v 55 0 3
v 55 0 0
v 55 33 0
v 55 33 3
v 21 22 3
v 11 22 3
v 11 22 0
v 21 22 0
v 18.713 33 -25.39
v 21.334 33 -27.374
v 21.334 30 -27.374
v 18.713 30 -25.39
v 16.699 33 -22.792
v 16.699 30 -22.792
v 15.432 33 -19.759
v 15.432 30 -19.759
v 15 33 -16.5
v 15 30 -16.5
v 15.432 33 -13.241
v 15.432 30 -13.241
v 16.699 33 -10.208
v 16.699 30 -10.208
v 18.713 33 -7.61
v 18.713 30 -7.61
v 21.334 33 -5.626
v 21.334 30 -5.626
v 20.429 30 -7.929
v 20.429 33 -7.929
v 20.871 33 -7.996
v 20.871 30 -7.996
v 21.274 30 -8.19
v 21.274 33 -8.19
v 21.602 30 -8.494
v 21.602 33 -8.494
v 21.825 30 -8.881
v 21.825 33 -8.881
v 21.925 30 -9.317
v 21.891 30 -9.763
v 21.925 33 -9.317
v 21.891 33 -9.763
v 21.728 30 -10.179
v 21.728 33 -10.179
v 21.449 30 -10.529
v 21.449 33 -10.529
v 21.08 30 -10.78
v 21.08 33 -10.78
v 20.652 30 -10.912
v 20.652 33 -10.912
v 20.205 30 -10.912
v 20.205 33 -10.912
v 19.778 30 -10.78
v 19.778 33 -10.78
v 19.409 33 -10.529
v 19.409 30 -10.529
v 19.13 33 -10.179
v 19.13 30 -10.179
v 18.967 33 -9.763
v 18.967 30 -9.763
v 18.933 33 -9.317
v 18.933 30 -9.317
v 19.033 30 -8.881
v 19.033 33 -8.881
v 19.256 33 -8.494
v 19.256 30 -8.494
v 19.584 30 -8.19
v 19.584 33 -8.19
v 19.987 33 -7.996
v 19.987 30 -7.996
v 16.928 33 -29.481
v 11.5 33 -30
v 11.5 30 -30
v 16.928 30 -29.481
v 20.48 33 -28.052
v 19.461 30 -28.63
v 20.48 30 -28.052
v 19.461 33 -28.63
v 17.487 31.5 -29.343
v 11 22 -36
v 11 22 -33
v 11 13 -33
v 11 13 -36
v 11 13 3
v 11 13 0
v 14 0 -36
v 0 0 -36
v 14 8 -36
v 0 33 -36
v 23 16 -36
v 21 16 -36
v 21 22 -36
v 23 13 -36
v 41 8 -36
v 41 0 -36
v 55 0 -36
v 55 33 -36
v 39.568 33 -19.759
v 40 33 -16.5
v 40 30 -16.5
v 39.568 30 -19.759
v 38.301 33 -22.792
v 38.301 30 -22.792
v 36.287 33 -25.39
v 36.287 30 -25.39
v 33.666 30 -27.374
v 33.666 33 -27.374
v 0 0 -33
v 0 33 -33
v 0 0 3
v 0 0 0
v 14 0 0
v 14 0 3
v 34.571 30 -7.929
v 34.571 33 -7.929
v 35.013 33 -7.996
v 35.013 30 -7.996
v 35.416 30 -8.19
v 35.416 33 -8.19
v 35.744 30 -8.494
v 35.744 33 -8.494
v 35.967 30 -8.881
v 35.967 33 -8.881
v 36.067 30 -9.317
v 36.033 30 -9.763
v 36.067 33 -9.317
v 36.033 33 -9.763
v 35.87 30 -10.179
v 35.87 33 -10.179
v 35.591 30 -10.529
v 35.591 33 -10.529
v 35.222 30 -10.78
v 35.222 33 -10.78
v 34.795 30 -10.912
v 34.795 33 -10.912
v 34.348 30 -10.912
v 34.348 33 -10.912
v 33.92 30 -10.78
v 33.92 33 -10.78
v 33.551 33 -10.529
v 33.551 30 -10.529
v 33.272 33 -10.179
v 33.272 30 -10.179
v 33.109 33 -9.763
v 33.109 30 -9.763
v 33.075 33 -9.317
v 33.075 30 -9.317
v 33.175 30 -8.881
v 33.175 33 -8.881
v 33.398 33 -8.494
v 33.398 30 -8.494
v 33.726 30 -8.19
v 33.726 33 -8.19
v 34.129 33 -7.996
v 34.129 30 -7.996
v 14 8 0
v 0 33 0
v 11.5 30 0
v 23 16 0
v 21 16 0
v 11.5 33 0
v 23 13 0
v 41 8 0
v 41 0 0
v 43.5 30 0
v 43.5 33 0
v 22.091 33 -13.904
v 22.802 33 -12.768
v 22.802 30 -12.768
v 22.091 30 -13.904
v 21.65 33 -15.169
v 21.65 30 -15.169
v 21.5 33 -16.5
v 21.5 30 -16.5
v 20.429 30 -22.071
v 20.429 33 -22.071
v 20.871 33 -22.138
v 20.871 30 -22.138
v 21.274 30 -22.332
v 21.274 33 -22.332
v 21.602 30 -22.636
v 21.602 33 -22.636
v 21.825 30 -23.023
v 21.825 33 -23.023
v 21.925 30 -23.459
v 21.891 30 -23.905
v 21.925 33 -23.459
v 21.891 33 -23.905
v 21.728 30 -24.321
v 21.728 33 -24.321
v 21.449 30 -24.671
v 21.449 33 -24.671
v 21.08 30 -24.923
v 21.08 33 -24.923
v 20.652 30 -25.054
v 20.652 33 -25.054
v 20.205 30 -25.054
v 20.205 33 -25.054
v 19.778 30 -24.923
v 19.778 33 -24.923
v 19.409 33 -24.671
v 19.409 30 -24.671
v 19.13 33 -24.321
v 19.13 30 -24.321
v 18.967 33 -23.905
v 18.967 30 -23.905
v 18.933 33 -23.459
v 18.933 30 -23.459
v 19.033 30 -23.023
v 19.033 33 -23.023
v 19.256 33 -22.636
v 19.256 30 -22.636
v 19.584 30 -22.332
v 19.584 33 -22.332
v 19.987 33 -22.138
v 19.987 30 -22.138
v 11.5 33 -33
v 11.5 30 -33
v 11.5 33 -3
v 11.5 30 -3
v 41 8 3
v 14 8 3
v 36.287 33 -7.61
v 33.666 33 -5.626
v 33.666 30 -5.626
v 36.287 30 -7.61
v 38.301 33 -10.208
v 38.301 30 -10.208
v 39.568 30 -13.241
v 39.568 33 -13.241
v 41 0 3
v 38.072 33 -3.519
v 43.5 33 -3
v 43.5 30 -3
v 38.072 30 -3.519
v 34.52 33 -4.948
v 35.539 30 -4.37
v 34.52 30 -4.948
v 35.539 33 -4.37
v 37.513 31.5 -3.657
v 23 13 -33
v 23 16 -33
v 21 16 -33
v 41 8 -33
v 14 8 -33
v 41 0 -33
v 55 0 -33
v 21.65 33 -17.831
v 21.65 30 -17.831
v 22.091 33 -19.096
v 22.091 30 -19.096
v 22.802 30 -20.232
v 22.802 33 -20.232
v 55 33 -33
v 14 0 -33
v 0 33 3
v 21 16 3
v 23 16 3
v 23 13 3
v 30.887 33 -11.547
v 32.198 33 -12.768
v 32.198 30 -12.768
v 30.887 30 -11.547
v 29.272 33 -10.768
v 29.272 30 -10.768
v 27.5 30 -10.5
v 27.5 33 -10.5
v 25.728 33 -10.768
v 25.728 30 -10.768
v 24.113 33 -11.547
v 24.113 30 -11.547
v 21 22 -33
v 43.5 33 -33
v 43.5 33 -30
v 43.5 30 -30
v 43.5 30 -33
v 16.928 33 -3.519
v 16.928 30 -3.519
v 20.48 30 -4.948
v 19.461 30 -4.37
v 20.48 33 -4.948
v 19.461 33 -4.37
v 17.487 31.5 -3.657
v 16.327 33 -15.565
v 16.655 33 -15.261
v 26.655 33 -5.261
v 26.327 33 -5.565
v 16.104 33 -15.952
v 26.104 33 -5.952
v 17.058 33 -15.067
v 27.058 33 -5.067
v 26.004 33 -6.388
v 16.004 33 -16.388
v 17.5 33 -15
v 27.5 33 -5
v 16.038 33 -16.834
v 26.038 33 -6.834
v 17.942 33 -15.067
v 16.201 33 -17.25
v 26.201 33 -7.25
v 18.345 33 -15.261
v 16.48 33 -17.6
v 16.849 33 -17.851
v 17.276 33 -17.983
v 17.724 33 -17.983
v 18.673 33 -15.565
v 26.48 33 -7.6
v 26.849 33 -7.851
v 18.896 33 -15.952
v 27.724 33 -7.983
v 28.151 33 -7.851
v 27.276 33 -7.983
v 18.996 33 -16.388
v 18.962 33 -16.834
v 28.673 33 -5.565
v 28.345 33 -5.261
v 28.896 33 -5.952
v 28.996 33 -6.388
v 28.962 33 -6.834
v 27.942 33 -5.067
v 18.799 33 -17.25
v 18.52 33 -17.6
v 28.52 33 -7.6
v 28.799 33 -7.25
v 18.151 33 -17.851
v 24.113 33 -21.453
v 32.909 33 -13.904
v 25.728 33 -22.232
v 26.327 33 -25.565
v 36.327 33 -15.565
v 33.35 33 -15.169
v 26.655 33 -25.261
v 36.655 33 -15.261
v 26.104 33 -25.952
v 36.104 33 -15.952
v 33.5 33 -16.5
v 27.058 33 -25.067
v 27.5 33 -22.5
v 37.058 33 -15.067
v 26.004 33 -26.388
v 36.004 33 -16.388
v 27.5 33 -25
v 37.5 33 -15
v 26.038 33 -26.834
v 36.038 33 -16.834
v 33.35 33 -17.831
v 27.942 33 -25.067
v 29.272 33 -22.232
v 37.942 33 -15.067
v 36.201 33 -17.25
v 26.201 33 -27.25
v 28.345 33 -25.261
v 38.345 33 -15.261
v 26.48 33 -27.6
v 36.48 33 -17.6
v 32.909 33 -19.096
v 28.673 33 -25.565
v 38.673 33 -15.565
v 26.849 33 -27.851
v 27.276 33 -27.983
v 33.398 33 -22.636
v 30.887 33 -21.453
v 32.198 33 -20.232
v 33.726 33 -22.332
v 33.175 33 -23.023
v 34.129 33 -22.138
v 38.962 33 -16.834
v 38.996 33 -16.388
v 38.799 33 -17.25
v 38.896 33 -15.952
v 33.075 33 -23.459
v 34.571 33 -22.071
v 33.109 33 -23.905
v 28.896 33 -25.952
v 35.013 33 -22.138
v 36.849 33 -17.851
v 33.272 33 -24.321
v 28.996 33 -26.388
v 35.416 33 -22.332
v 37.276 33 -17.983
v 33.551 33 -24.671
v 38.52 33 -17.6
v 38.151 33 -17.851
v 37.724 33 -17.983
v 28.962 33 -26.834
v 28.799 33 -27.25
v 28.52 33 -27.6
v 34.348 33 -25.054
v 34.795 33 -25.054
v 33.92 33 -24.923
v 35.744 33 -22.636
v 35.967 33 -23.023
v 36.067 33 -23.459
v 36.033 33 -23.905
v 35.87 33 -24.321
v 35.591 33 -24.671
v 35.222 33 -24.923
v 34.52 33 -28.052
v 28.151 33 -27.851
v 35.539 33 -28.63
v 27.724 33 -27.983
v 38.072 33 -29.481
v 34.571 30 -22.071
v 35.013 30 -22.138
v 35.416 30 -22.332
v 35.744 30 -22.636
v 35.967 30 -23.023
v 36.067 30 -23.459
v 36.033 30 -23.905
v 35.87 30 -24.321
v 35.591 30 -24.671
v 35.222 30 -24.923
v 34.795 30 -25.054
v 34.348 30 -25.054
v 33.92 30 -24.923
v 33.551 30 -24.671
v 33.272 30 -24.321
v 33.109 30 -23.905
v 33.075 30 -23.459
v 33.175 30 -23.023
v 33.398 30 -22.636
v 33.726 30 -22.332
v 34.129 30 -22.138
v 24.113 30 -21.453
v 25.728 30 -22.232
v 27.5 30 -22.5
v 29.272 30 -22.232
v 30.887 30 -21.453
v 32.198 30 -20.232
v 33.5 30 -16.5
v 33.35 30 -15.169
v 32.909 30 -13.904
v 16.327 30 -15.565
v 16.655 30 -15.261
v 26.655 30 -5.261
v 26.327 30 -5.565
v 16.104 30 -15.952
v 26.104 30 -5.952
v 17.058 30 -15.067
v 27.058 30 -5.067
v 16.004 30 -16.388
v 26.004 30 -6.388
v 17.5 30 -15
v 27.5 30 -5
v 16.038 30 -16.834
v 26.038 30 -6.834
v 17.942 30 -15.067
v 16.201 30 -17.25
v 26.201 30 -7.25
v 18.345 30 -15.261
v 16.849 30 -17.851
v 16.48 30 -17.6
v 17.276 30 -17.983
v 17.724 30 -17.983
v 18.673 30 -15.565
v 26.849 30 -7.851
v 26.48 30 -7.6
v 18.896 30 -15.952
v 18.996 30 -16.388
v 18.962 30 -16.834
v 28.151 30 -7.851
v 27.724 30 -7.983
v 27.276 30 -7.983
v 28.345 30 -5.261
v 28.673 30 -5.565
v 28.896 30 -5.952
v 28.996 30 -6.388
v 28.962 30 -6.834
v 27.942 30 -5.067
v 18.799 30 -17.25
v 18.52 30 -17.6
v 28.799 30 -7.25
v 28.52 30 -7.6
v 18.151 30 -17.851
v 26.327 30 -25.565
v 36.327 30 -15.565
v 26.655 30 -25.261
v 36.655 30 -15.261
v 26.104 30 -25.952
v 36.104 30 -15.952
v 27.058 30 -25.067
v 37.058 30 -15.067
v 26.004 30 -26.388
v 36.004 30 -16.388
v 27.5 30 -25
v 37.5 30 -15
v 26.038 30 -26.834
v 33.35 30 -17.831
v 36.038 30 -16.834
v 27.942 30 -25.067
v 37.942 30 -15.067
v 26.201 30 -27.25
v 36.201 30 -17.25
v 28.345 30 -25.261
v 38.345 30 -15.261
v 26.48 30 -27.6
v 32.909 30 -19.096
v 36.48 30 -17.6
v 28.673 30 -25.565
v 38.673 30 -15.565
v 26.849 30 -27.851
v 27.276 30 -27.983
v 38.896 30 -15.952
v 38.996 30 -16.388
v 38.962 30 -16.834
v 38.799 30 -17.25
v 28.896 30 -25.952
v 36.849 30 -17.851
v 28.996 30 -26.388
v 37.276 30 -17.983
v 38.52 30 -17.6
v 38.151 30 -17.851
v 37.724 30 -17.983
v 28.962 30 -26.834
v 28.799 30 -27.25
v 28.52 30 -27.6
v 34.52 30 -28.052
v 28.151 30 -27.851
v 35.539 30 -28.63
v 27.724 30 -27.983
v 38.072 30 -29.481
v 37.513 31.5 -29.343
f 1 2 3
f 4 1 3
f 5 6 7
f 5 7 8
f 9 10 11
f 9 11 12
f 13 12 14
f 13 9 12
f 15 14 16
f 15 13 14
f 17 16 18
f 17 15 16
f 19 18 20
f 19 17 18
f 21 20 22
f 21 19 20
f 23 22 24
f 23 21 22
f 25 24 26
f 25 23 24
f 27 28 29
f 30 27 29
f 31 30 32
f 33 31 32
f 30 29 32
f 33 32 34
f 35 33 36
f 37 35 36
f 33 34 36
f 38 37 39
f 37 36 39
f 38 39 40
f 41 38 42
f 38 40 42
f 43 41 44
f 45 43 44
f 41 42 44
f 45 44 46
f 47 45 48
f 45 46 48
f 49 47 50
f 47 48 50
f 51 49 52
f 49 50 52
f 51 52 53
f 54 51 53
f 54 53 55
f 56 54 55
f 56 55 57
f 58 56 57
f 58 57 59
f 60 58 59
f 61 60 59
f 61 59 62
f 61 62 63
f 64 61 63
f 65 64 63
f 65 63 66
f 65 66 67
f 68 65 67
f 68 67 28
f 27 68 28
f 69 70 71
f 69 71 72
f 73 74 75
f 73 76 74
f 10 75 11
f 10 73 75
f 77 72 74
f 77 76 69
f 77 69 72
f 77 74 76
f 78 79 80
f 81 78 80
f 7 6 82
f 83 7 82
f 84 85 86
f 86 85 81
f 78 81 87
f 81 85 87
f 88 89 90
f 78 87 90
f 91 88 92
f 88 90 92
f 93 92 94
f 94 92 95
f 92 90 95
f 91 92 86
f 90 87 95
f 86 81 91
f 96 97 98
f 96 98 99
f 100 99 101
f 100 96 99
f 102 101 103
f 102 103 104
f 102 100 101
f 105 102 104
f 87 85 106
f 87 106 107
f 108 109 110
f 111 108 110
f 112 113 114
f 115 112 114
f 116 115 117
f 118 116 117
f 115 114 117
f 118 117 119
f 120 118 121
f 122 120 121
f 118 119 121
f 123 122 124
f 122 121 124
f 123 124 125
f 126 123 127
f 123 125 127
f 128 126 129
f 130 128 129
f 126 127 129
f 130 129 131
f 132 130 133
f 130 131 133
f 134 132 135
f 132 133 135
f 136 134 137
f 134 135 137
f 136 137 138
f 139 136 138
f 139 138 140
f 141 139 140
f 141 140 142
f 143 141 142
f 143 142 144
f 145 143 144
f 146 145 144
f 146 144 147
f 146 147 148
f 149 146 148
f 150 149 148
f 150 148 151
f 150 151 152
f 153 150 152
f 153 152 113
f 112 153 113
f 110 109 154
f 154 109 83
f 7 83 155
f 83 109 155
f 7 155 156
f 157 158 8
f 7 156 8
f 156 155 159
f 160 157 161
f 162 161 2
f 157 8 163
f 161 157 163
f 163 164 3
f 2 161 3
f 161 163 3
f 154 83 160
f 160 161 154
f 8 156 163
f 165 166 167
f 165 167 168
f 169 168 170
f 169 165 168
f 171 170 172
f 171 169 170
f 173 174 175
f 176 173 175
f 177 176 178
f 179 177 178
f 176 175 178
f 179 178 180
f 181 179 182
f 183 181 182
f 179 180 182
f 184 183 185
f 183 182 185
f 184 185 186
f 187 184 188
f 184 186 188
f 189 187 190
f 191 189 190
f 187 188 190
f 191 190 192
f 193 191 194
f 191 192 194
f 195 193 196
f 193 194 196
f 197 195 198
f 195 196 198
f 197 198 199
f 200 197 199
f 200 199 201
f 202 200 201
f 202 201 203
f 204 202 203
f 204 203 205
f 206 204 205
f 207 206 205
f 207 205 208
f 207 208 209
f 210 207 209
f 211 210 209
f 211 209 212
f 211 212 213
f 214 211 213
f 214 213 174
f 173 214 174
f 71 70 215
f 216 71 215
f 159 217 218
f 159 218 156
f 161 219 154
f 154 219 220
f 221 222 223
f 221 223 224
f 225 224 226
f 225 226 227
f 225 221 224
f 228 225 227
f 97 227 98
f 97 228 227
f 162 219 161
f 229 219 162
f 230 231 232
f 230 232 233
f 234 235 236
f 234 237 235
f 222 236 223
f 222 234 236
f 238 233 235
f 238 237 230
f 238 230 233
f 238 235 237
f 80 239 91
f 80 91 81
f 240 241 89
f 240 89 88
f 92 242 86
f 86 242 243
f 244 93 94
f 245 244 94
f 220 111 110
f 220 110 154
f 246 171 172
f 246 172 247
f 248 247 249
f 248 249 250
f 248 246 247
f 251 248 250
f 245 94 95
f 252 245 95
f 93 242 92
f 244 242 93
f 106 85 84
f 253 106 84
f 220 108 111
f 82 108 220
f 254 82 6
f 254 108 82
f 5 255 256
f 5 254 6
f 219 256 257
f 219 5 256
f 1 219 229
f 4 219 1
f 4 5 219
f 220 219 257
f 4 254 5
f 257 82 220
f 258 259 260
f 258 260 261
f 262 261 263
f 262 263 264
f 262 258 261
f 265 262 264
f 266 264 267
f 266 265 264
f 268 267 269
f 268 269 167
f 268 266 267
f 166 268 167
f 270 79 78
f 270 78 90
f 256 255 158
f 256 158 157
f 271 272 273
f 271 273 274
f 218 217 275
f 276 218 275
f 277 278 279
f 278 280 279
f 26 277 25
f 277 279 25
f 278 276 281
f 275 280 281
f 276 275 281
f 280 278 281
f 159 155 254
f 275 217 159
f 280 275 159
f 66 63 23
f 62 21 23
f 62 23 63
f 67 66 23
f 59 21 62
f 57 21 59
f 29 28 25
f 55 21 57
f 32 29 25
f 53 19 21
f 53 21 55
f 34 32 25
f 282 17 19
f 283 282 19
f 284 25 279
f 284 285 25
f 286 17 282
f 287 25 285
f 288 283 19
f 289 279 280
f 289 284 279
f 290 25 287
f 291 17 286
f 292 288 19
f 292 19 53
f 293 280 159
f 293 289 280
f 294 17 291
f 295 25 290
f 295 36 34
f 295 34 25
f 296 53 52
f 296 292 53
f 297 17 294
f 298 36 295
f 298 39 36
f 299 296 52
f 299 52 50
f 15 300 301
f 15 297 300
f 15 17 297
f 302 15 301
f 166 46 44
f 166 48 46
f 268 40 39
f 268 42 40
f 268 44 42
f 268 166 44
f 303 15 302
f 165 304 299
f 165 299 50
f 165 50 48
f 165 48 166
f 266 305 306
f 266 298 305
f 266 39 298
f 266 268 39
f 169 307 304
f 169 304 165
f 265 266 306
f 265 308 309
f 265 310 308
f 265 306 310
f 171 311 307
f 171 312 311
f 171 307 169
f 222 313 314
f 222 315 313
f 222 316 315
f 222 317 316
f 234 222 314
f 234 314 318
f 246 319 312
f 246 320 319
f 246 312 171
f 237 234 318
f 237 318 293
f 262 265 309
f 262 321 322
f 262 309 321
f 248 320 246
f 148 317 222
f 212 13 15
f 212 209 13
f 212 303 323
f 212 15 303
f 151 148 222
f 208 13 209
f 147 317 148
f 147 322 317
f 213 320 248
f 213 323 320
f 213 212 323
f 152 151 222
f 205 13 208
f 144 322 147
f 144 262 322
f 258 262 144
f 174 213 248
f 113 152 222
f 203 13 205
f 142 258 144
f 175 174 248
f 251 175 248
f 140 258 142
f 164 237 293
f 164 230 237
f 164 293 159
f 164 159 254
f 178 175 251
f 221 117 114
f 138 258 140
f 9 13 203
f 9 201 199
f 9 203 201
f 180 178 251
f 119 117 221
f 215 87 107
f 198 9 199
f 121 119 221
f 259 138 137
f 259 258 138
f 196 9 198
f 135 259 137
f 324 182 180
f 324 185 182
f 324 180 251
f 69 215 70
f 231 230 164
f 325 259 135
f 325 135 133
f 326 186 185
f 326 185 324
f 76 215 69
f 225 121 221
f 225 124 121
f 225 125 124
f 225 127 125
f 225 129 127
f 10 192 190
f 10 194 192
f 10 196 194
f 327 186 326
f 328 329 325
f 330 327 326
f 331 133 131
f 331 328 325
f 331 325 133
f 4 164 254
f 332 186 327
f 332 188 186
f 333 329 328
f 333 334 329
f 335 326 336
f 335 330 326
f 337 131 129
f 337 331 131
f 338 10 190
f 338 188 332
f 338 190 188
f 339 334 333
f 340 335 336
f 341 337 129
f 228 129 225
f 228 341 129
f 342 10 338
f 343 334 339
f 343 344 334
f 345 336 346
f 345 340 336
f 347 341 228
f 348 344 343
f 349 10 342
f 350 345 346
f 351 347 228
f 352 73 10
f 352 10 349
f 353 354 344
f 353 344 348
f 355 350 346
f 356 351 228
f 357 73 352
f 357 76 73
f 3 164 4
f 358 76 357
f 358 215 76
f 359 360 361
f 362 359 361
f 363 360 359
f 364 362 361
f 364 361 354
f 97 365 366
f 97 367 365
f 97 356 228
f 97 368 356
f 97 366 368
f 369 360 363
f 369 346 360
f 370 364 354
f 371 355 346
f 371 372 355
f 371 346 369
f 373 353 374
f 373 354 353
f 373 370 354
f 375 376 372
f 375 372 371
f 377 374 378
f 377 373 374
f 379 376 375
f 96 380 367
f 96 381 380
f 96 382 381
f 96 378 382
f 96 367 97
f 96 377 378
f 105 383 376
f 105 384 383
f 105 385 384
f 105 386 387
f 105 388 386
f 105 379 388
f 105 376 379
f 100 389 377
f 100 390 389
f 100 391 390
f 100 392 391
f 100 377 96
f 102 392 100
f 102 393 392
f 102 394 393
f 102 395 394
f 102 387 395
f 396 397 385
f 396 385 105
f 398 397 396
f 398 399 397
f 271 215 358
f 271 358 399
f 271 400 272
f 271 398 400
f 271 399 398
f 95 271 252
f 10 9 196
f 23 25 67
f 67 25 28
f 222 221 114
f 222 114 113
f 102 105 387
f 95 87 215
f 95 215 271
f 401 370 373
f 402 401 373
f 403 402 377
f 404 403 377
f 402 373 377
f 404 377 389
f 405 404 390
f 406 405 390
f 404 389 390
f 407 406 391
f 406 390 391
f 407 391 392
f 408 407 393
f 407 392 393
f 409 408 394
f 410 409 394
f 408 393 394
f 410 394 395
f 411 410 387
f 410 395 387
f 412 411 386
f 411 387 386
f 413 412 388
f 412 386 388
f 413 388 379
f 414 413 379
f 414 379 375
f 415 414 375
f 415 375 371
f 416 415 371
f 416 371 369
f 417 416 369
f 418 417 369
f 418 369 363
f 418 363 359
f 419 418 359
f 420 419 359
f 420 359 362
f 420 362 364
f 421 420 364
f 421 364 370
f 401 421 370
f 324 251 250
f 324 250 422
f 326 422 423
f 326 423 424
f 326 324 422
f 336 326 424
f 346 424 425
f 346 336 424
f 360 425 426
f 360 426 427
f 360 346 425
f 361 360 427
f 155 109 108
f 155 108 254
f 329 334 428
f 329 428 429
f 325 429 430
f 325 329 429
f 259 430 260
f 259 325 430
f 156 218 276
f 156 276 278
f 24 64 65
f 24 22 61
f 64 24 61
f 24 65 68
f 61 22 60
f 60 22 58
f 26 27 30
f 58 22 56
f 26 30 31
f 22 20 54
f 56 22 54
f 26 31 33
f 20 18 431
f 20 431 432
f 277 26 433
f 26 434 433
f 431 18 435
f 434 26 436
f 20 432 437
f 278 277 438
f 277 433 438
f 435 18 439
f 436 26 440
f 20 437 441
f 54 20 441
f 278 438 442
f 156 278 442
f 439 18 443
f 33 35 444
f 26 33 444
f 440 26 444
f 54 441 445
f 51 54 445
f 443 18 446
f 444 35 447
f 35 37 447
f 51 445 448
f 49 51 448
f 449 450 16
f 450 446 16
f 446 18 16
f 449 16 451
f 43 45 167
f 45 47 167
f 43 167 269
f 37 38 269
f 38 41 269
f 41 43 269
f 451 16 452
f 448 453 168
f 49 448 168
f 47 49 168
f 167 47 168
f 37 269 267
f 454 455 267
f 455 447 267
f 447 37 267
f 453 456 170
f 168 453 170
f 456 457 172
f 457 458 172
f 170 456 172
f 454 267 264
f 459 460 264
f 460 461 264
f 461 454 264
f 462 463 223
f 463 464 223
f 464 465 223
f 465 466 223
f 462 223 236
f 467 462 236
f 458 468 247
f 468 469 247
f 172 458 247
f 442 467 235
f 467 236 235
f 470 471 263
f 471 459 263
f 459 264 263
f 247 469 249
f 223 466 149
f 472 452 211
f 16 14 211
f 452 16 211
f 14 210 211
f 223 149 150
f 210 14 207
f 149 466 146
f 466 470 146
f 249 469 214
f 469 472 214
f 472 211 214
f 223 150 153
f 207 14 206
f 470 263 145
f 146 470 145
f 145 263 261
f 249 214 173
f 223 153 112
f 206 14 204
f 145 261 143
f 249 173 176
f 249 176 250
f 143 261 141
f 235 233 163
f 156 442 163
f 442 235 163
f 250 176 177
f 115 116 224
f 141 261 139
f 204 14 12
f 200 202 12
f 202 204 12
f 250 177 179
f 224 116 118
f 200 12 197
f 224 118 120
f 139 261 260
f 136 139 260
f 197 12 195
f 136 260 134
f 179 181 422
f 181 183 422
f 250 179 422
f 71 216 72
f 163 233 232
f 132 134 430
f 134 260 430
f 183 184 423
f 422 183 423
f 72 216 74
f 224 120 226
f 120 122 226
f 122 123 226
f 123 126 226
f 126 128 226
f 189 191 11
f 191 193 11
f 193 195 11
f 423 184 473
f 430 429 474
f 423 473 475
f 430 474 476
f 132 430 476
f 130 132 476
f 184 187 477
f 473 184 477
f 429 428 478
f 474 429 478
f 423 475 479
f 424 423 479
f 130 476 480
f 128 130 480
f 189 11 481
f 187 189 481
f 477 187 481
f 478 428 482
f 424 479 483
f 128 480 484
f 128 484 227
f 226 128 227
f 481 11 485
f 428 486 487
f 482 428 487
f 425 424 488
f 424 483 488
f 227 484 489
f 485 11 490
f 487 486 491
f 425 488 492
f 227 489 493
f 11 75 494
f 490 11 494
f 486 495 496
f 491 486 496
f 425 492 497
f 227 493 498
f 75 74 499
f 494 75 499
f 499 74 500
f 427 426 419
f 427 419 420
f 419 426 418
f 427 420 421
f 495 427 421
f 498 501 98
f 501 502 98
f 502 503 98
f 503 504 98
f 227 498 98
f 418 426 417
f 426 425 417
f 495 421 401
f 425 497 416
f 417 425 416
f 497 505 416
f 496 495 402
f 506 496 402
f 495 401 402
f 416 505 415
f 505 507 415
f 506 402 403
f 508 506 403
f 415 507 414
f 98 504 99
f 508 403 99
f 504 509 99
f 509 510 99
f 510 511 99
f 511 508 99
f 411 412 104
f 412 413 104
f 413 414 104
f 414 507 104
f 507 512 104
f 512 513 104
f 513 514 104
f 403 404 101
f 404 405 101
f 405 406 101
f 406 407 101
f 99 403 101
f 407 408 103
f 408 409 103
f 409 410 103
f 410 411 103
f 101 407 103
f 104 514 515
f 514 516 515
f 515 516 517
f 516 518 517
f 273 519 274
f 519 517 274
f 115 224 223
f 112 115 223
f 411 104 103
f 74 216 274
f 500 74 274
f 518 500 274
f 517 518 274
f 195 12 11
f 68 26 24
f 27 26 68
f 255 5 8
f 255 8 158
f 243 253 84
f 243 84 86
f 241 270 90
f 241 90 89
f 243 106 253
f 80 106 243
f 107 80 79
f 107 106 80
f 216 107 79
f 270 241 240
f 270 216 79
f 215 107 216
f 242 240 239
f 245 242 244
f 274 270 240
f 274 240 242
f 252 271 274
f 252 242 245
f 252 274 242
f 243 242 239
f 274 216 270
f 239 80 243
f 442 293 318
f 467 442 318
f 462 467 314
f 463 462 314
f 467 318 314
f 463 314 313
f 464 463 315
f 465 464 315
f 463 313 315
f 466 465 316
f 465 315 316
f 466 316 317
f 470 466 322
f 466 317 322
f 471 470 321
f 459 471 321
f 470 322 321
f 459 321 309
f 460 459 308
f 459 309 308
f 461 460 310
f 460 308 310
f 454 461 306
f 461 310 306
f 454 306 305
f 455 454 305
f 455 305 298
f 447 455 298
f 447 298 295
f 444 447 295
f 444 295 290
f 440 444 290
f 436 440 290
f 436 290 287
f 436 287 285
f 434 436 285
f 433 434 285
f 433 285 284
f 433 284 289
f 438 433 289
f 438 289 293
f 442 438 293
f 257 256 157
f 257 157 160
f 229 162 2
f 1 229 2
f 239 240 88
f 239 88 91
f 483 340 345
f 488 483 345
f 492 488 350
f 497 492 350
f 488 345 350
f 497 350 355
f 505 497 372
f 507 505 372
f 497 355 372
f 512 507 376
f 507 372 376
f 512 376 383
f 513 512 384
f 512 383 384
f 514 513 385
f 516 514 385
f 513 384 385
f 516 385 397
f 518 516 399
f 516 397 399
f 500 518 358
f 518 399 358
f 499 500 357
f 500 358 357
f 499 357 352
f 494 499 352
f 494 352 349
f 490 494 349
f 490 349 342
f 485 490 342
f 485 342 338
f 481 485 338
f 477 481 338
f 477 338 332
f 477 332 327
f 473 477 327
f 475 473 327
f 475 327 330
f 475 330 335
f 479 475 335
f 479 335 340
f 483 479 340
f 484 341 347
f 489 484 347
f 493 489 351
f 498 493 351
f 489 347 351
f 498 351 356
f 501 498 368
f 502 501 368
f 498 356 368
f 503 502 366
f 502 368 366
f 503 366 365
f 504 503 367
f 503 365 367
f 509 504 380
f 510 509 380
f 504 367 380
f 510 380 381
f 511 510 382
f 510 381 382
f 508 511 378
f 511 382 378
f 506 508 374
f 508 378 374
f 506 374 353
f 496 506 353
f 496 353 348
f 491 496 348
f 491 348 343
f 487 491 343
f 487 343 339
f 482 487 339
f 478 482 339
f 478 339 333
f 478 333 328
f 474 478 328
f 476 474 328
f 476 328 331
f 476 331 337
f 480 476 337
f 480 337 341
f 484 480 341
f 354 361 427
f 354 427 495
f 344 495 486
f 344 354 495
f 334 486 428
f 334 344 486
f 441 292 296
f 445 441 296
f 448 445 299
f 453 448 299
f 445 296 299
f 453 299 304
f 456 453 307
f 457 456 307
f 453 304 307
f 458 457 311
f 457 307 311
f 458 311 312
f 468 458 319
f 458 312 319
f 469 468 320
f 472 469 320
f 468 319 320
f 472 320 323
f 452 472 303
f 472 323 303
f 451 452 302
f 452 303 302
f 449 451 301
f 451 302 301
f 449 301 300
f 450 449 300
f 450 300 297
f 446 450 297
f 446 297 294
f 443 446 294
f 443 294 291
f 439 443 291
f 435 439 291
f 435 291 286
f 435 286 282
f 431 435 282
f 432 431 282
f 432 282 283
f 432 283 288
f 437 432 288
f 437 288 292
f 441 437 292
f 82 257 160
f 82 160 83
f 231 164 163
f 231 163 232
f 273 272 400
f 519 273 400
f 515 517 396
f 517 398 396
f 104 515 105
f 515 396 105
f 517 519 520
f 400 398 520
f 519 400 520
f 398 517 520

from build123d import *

# Parameters (mm, degrees)
ESQUISSE1_W                = 55
ESQUISSE1_H                = 33
BOSS_EXTRU_1_DEPTH         = 3
ENL_V_MAT_EXTRU_1_REACH    = 66.211
ENL_V_MAT_EXTRU_2_REACH    = 66.211
ESQUISSE4_W                = 32
ESQUISSE4_H                = 3
BOSS_EXTRU_2_DEPTH         = 3
ENL_V_MAT_EXTRU_3_REACH    = 74.132
ESQUISSE5_R                = 1.5
R_P_TITION_LIN_AIRE1_COUNT = 2
R_P_TITION_LIN_AIRE1_PITCH = 36


with BuildPart() as part:
    # Esquisse1 → Boss.-Extru.1 (new body)
    with BuildSketch(Plane.XY):
        with Locations((27.5, 16.5)):
            Rectangle(ESQUISSE1_W, ESQUISSE1_H)
    boss_extru_1 = extrude(amount=BOSS_EXTRU_1_DEPTH)

    # Esquisse2 → Enlèv. mat.-Extru.1 (cut, up to next)
    with BuildSketch(Plane.XY.offset(3), mode=Mode.PRIVATE) as enl_v_mat_extru_1_sk1:
        Polygon((27.5, 8), (41, 8), (41, 0), (14, 0), (14, 8), align=None)
    enl_v_mat_extru_1_tool1 = extrude(enl_v_mat_extru_1_sk1.sketch, amount=-ENL_V_MAT_EXTRU_1_REACH, mode=Mode.PRIVATE) & part.part
    enl_v_mat_extru_1 = enl_v_mat_extru_1_tool1.solids().sort_by_distance((27.5, 4, 3))[0]
    add(enl_v_mat_extru_1, mode=Mode.SUBTRACT)

    # Esquisse3 → Enlèv. mat.-Extru.2 (cut, up to next)
    with BuildSketch(Plane.XY.offset(3), mode=Mode.PRIVATE) as enl_v_mat_extru_2_sk1:
        Polygon((11, 22), (21, 22), (21, 16), (23, 16), (23, 13), (11, 13), (11, 16), align=None)
    enl_v_mat_extru_2_tool1 = extrude(enl_v_mat_extru_2_sk1.sketch, amount=-ENL_V_MAT_EXTRU_2_REACH, mode=Mode.PRIVATE) & part.part
    enl_v_mat_extru_2 = enl_v_mat_extru_2_tool1.solids().sort_by_distance((16.375, 17.3125, 3))[0]
    add(enl_v_mat_extru_2, mode=Mode.SUBTRACT)

    # Esquisse4 → Boss.-Extru.2 (add)
    with BuildSketch(Plane(origin=(0, 33, 0), x_dir=(1, 0, 0), z_dir=(0, 1, 0))):
        Polygon((11.5, 0), (27.5, 0), (43.5, 0), (43.5, 3), (11.5, 3), align=None)
        with BuildLine():
            add(Edge.make_bspline(
                [(11.5, 3), (18.557221365, 3), (21.334379392, 5.626402504)],
                knots=[0, 0, 0, 0.441076335, 0.441076335, 0.441076335], degree=2))
            Line((11.5, 3), (43.5, 3))
            add(Edge.make_bspline(
                [(43.5, 3), (36.442778635, 3), (33.665620608, 5.626402504)],
                knots=[0, 0, 0, 0.441076335, 0.441076335, 0.441076335], degree=2))
            ThreePointArc((33.665620608, 5.626402504), (27.5, 4), (21.334379392, 5.626402504))
        make_face()
        with BuildLine():
            add(Edge.make_bspline(
                [(21.334379392, 5.626402504), (23.913128098, 8.065166158), (22.80153106, 12.768460155)],
                knots=[0.441076335, 0.441076335, 0.441076335, 0.850640724, 0.850640724, 0.850640724], degree=2))
            ThreePointArc((21.334379392, 5.626402504), (27.5, 4), (33.665620608, 5.626402504))
            add(Edge.make_bspline(
                [(33.665620608, 5.626402504), (31.086871902, 8.065166158), (32.19846894, 12.768460155)],
                knots=[0.441076335, 0.441076335, 0.441076335, 0.850640724, 0.850640724, 0.850640724], degree=2))
            ThreePointArc((32.19846894, 12.768460155), (27.5, 10.5), (22.80153106, 12.768460155))
        make_face()
        with BuildLine():
            add(Edge.make_bspline(
                [(33.665620608, 5.626402504), (31.086871902, 8.065166158), (32.19846894, 12.768460155)],
                knots=[0.441076335, 0.441076335, 0.441076335, 0.850640724, 0.850640724, 0.850640724], degree=2))
            ThreePointArc((33.665620608, 5.626402504), (38.300931849, 10.207951749), (40, 16.5))
            ThreePointArc((40, 16.5), (38.300931849, 22.792048251), (33.665620608, 27.373597496))
            add(Edge.make_bspline(
                [(33.665620608, 27.373597496), (31.086871902, 24.934833842), (32.19846894, 20.231539845)],
                knots=[0.441076335, 0.441076335, 0.441076335, 0.850640724, 0.850640724, 0.850640724], degree=2))
            ThreePointArc((32.19846894, 20.231539845), (33.165280825, 18.476004347), (33.5, 16.5))
            ThreePointArc((33.5, 16.5), (33.165280825, 14.523995653), (32.19846894, 12.768460155))
        make_face()
        with BuildLine():
            ThreePointArc((21.334379392, 27.373597496), (15, 16.5), (21.334379392, 5.626402504))
            add(Edge.make_bspline(
                [(21.334379392, 5.626402504), (23.913128098, 8.065166158), (22.80153106, 12.768460155)],
                knots=[0.441076335, 0.441076335, 0.441076335, 0.850640724, 0.850640724, 0.850640724], degree=2))
            ThreePointArc((22.80153106, 12.768460155), (21.834719175, 14.523995653), (21.5, 16.5))
            ThreePointArc((21.5, 16.5), (21.834719175, 18.476004347), (22.80153106, 20.231539845))
            add(Edge.make_bspline(
                [(21.334379392, 27.373597496), (23.913128098, 24.934833842), (22.80153106, 20.231539845)],
                knots=[0.441076335, 0.441076335, 0.441076335, 0.850640724, 0.850640724, 0.850640724], degree=2))
        make_face()
        with BuildLine():
            ThreePointArc((33.665620608, 27.373597496), (27.5, 29), (21.334379392, 27.373597496))
            add(Edge.make_bspline(
                [(21.334379392, 27.373597496), (23.913128098, 24.934833842), (22.80153106, 20.231539845)],
                knots=[0.441076335, 0.441076335, 0.441076335, 0.850640724, 0.850640724, 0.850640724], degree=2))
            ThreePointArc((22.80153106, 20.231539845), (27.5, 22.5), (32.19846894, 20.231539845))
            add(Edge.make_bspline(
                [(33.665620608, 27.373597496), (31.086871902, 24.934833842), (32.19846894, 20.231539845)],
                knots=[0.441076335, 0.441076335, 0.441076335, 0.850640724, 0.850640724, 0.850640724], degree=2))
        make_face()
        with BuildLine():
            add(Edge.make_bspline(
                [(11.5, 30), (18.557221365, 30), (21.334379392, 27.373597496)],
                knots=[0, 0, 0, 0.441076335, 0.441076335, 0.441076335], degree=2))
            ThreePointArc((21.334379392, 27.373597496), (27.5, 29), (33.665620608, 27.373597496))
            add(Edge.make_bspline(
                [(43.5, 30), (36.442778635, 30), (33.665620608, 27.373597496)],
                knots=[0, 0, 0, 0.441076335, 0.441076335, 0.441076335], degree=2))
            Line((43.5, 30), (11.5, 30))
        make_face()
        with Locations((27.5, 31.5)):
            Rectangle(ESQUISSE4_W, ESQUISSE4_H)
    extrude(amount=-BOSS_EXTRU_2_DEPTH)

    # Esquisse5 → Enlèv. mat.-Extru.3 (cut, up to next)
    with BuildSketch(Plane(origin=(0, 33, 0), x_dir=(1, 0, 0), z_dir=(0, 1, 0)), mode=Mode.PRIVATE) as enl_v_mat_extru_3_sk1:
        with Locations(Location((27.5, 26.5, 0), (0, 0, 270))):
            Circle(ESQUISSE5_R)
    enl_v_mat_extru_3_tool1 = extrude(enl_v_mat_extru_3_sk1.sketch, amount=-ENL_V_MAT_EXTRU_3_REACH, mode=Mode.PRIVATE) & part.part
    # Esquisse5 → Enlèv. mat.-Extru.3 (cut, up to next)
    with BuildSketch(Plane(origin=(0, 33, 0), x_dir=(1, 0, 0), z_dir=(0, 1, 0)), mode=Mode.PRIVATE) as enl_v_mat_extru_3_sk2:
        with Locations(Location((20.428932188, 23.571067812, 0), (0, 0, 270))):
            Circle(ESQUISSE5_R)
    enl_v_mat_extru_3_tool2 = extrude(enl_v_mat_extru_3_sk2.sketch, amount=-ENL_V_MAT_EXTRU_3_REACH, mode=Mode.PRIVATE) & part.part
    # Esquisse5 → Enlèv. mat.-Extru.3 (cut, up to next)
    with BuildSketch(Plane(origin=(0, 33, 0), x_dir=(1, 0, 0), z_dir=(0, 1, 0)), mode=Mode.PRIVATE) as enl_v_mat_extru_3_sk3:
        with Locations(Location((17.5, 16.5, 0), (0, 0, 270))):
            Circle(ESQUISSE5_R)
    enl_v_mat_extru_3_tool3 = extrude(enl_v_mat_extru_3_sk3.sketch, amount=-ENL_V_MAT_EXTRU_3_REACH, mode=Mode.PRIVATE) & part.part
    # Esquisse5 → Enlèv. mat.-Extru.3 (cut, up to next)
    with BuildSketch(Plane(origin=(0, 33, 0), x_dir=(1, 0, 0), z_dir=(0, 1, 0)), mode=Mode.PRIVATE) as enl_v_mat_extru_3_sk4:
        with Locations(Location((27.5, 6.5, 0), (0, 0, 270))):
            Circle(ESQUISSE5_R)
    enl_v_mat_extru_3_tool4 = extrude(enl_v_mat_extru_3_sk4.sketch, amount=-ENL_V_MAT_EXTRU_3_REACH, mode=Mode.PRIVATE) & part.part
    # Esquisse5 → Enlèv. mat.-Extru.3 (cut, up to next)
    with BuildSketch(Plane(origin=(0, 33, 0), x_dir=(1, 0, 0), z_dir=(0, 1, 0)), mode=Mode.PRIVATE) as enl_v_mat_extru_3_sk5:
        with Locations(Location((34.571067812, 9.428932188, 0), (0, 0, 270))):
            Circle(ESQUISSE5_R)
    enl_v_mat_extru_3_tool5 = extrude(enl_v_mat_extru_3_sk5.sketch, amount=-ENL_V_MAT_EXTRU_3_REACH, mode=Mode.PRIVATE) & part.part
    # Esquisse5 → Enlèv. mat.-Extru.3 (cut, up to next)
    with BuildSketch(Plane(origin=(0, 33, 0), x_dir=(1, 0, 0), z_dir=(0, 1, 0)), mode=Mode.PRIVATE) as enl_v_mat_extru_3_sk6:
        with Locations(Location((37.5, 16.5, 0), (0, 0, 270))):
            Circle(ESQUISSE5_R)
    enl_v_mat_extru_3_tool6 = extrude(enl_v_mat_extru_3_sk6.sketch, amount=-ENL_V_MAT_EXTRU_3_REACH, mode=Mode.PRIVATE) & part.part
    # Esquisse5 → Enlèv. mat.-Extru.3 (cut, up to next)
    with BuildSketch(Plane(origin=(0, 33, 0), x_dir=(1, 0, 0), z_dir=(0, 1, 0)), mode=Mode.PRIVATE) as enl_v_mat_extru_3_sk7:
        with Locations(Location((34.571067812, 23.571067812, 0), (0, 0, 270))):
            Circle(ESQUISSE5_R)
    enl_v_mat_extru_3_tool7 = extrude(enl_v_mat_extru_3_sk7.sketch, amount=-ENL_V_MAT_EXTRU_3_REACH, mode=Mode.PRIVATE) & part.part
    # Esquisse5 → Enlèv. mat.-Extru.3 (cut, up to next)
    with BuildSketch(Plane(origin=(0, 33, 0), x_dir=(1, 0, 0), z_dir=(0, 1, 0)), mode=Mode.PRIVATE) as enl_v_mat_extru_3_sk8:
        with Locations(Location((20.428932188, 9.428932188, 0), (0, 0, 270))):
            Circle(ESQUISSE5_R)
    enl_v_mat_extru_3_tool8 = extrude(enl_v_mat_extru_3_sk8.sketch, amount=-ENL_V_MAT_EXTRU_3_REACH, mode=Mode.PRIVATE) & part.part
    add(enl_v_mat_extru_3_tool1.solids().sort_by_distance((27.5, 33, -26.5))[0], mode=Mode.SUBTRACT)
    add(enl_v_mat_extru_3_tool2.solids().sort_by_distance((20.428932, 33, -23.571068))[0], mode=Mode.SUBTRACT)
    add(enl_v_mat_extru_3_tool3.solids().sort_by_distance((17.5, 33, -16.5))[0], mode=Mode.SUBTRACT)
    add(enl_v_mat_extru_3_tool4.solids().sort_by_distance((27.5, 33, -6.5))[0], mode=Mode.SUBTRACT)
    add(enl_v_mat_extru_3_tool5.solids().sort_by_distance((34.571068, 33, -9.428932))[0], mode=Mode.SUBTRACT)
    add(enl_v_mat_extru_3_tool6.solids().sort_by_distance((37.5, 33, -16.5))[0], mode=Mode.SUBTRACT)
    add(enl_v_mat_extru_3_tool7.solids().sort_by_distance((34.571068, 33, -23.571068))[0], mode=Mode.SUBTRACT)
    add(enl_v_mat_extru_3_tool8.solids().sort_by_distance((20.428932, 33, -9.428932))[0], mode=Mode.SUBTRACT)

    # Répétition linéaire1: Boss.-Extru.1, Enlèv. mat.-Extru.1, Enlèv. mat.-Extru.2 ×2
    with Locations(*[(0, 0, -i * R_P_TITION_LIN_AIRE1_PITCH) for i in range(1, R_P_TITION_LIN_AIRE1_COUNT)]):
        add(boss_extru_1)
        add(enl_v_mat_extru_1, mode=Mode.SUBTRACT)
        add(enl_v_mat_extru_2, mode=Mode.SUBTRACT)


solid = part.part
